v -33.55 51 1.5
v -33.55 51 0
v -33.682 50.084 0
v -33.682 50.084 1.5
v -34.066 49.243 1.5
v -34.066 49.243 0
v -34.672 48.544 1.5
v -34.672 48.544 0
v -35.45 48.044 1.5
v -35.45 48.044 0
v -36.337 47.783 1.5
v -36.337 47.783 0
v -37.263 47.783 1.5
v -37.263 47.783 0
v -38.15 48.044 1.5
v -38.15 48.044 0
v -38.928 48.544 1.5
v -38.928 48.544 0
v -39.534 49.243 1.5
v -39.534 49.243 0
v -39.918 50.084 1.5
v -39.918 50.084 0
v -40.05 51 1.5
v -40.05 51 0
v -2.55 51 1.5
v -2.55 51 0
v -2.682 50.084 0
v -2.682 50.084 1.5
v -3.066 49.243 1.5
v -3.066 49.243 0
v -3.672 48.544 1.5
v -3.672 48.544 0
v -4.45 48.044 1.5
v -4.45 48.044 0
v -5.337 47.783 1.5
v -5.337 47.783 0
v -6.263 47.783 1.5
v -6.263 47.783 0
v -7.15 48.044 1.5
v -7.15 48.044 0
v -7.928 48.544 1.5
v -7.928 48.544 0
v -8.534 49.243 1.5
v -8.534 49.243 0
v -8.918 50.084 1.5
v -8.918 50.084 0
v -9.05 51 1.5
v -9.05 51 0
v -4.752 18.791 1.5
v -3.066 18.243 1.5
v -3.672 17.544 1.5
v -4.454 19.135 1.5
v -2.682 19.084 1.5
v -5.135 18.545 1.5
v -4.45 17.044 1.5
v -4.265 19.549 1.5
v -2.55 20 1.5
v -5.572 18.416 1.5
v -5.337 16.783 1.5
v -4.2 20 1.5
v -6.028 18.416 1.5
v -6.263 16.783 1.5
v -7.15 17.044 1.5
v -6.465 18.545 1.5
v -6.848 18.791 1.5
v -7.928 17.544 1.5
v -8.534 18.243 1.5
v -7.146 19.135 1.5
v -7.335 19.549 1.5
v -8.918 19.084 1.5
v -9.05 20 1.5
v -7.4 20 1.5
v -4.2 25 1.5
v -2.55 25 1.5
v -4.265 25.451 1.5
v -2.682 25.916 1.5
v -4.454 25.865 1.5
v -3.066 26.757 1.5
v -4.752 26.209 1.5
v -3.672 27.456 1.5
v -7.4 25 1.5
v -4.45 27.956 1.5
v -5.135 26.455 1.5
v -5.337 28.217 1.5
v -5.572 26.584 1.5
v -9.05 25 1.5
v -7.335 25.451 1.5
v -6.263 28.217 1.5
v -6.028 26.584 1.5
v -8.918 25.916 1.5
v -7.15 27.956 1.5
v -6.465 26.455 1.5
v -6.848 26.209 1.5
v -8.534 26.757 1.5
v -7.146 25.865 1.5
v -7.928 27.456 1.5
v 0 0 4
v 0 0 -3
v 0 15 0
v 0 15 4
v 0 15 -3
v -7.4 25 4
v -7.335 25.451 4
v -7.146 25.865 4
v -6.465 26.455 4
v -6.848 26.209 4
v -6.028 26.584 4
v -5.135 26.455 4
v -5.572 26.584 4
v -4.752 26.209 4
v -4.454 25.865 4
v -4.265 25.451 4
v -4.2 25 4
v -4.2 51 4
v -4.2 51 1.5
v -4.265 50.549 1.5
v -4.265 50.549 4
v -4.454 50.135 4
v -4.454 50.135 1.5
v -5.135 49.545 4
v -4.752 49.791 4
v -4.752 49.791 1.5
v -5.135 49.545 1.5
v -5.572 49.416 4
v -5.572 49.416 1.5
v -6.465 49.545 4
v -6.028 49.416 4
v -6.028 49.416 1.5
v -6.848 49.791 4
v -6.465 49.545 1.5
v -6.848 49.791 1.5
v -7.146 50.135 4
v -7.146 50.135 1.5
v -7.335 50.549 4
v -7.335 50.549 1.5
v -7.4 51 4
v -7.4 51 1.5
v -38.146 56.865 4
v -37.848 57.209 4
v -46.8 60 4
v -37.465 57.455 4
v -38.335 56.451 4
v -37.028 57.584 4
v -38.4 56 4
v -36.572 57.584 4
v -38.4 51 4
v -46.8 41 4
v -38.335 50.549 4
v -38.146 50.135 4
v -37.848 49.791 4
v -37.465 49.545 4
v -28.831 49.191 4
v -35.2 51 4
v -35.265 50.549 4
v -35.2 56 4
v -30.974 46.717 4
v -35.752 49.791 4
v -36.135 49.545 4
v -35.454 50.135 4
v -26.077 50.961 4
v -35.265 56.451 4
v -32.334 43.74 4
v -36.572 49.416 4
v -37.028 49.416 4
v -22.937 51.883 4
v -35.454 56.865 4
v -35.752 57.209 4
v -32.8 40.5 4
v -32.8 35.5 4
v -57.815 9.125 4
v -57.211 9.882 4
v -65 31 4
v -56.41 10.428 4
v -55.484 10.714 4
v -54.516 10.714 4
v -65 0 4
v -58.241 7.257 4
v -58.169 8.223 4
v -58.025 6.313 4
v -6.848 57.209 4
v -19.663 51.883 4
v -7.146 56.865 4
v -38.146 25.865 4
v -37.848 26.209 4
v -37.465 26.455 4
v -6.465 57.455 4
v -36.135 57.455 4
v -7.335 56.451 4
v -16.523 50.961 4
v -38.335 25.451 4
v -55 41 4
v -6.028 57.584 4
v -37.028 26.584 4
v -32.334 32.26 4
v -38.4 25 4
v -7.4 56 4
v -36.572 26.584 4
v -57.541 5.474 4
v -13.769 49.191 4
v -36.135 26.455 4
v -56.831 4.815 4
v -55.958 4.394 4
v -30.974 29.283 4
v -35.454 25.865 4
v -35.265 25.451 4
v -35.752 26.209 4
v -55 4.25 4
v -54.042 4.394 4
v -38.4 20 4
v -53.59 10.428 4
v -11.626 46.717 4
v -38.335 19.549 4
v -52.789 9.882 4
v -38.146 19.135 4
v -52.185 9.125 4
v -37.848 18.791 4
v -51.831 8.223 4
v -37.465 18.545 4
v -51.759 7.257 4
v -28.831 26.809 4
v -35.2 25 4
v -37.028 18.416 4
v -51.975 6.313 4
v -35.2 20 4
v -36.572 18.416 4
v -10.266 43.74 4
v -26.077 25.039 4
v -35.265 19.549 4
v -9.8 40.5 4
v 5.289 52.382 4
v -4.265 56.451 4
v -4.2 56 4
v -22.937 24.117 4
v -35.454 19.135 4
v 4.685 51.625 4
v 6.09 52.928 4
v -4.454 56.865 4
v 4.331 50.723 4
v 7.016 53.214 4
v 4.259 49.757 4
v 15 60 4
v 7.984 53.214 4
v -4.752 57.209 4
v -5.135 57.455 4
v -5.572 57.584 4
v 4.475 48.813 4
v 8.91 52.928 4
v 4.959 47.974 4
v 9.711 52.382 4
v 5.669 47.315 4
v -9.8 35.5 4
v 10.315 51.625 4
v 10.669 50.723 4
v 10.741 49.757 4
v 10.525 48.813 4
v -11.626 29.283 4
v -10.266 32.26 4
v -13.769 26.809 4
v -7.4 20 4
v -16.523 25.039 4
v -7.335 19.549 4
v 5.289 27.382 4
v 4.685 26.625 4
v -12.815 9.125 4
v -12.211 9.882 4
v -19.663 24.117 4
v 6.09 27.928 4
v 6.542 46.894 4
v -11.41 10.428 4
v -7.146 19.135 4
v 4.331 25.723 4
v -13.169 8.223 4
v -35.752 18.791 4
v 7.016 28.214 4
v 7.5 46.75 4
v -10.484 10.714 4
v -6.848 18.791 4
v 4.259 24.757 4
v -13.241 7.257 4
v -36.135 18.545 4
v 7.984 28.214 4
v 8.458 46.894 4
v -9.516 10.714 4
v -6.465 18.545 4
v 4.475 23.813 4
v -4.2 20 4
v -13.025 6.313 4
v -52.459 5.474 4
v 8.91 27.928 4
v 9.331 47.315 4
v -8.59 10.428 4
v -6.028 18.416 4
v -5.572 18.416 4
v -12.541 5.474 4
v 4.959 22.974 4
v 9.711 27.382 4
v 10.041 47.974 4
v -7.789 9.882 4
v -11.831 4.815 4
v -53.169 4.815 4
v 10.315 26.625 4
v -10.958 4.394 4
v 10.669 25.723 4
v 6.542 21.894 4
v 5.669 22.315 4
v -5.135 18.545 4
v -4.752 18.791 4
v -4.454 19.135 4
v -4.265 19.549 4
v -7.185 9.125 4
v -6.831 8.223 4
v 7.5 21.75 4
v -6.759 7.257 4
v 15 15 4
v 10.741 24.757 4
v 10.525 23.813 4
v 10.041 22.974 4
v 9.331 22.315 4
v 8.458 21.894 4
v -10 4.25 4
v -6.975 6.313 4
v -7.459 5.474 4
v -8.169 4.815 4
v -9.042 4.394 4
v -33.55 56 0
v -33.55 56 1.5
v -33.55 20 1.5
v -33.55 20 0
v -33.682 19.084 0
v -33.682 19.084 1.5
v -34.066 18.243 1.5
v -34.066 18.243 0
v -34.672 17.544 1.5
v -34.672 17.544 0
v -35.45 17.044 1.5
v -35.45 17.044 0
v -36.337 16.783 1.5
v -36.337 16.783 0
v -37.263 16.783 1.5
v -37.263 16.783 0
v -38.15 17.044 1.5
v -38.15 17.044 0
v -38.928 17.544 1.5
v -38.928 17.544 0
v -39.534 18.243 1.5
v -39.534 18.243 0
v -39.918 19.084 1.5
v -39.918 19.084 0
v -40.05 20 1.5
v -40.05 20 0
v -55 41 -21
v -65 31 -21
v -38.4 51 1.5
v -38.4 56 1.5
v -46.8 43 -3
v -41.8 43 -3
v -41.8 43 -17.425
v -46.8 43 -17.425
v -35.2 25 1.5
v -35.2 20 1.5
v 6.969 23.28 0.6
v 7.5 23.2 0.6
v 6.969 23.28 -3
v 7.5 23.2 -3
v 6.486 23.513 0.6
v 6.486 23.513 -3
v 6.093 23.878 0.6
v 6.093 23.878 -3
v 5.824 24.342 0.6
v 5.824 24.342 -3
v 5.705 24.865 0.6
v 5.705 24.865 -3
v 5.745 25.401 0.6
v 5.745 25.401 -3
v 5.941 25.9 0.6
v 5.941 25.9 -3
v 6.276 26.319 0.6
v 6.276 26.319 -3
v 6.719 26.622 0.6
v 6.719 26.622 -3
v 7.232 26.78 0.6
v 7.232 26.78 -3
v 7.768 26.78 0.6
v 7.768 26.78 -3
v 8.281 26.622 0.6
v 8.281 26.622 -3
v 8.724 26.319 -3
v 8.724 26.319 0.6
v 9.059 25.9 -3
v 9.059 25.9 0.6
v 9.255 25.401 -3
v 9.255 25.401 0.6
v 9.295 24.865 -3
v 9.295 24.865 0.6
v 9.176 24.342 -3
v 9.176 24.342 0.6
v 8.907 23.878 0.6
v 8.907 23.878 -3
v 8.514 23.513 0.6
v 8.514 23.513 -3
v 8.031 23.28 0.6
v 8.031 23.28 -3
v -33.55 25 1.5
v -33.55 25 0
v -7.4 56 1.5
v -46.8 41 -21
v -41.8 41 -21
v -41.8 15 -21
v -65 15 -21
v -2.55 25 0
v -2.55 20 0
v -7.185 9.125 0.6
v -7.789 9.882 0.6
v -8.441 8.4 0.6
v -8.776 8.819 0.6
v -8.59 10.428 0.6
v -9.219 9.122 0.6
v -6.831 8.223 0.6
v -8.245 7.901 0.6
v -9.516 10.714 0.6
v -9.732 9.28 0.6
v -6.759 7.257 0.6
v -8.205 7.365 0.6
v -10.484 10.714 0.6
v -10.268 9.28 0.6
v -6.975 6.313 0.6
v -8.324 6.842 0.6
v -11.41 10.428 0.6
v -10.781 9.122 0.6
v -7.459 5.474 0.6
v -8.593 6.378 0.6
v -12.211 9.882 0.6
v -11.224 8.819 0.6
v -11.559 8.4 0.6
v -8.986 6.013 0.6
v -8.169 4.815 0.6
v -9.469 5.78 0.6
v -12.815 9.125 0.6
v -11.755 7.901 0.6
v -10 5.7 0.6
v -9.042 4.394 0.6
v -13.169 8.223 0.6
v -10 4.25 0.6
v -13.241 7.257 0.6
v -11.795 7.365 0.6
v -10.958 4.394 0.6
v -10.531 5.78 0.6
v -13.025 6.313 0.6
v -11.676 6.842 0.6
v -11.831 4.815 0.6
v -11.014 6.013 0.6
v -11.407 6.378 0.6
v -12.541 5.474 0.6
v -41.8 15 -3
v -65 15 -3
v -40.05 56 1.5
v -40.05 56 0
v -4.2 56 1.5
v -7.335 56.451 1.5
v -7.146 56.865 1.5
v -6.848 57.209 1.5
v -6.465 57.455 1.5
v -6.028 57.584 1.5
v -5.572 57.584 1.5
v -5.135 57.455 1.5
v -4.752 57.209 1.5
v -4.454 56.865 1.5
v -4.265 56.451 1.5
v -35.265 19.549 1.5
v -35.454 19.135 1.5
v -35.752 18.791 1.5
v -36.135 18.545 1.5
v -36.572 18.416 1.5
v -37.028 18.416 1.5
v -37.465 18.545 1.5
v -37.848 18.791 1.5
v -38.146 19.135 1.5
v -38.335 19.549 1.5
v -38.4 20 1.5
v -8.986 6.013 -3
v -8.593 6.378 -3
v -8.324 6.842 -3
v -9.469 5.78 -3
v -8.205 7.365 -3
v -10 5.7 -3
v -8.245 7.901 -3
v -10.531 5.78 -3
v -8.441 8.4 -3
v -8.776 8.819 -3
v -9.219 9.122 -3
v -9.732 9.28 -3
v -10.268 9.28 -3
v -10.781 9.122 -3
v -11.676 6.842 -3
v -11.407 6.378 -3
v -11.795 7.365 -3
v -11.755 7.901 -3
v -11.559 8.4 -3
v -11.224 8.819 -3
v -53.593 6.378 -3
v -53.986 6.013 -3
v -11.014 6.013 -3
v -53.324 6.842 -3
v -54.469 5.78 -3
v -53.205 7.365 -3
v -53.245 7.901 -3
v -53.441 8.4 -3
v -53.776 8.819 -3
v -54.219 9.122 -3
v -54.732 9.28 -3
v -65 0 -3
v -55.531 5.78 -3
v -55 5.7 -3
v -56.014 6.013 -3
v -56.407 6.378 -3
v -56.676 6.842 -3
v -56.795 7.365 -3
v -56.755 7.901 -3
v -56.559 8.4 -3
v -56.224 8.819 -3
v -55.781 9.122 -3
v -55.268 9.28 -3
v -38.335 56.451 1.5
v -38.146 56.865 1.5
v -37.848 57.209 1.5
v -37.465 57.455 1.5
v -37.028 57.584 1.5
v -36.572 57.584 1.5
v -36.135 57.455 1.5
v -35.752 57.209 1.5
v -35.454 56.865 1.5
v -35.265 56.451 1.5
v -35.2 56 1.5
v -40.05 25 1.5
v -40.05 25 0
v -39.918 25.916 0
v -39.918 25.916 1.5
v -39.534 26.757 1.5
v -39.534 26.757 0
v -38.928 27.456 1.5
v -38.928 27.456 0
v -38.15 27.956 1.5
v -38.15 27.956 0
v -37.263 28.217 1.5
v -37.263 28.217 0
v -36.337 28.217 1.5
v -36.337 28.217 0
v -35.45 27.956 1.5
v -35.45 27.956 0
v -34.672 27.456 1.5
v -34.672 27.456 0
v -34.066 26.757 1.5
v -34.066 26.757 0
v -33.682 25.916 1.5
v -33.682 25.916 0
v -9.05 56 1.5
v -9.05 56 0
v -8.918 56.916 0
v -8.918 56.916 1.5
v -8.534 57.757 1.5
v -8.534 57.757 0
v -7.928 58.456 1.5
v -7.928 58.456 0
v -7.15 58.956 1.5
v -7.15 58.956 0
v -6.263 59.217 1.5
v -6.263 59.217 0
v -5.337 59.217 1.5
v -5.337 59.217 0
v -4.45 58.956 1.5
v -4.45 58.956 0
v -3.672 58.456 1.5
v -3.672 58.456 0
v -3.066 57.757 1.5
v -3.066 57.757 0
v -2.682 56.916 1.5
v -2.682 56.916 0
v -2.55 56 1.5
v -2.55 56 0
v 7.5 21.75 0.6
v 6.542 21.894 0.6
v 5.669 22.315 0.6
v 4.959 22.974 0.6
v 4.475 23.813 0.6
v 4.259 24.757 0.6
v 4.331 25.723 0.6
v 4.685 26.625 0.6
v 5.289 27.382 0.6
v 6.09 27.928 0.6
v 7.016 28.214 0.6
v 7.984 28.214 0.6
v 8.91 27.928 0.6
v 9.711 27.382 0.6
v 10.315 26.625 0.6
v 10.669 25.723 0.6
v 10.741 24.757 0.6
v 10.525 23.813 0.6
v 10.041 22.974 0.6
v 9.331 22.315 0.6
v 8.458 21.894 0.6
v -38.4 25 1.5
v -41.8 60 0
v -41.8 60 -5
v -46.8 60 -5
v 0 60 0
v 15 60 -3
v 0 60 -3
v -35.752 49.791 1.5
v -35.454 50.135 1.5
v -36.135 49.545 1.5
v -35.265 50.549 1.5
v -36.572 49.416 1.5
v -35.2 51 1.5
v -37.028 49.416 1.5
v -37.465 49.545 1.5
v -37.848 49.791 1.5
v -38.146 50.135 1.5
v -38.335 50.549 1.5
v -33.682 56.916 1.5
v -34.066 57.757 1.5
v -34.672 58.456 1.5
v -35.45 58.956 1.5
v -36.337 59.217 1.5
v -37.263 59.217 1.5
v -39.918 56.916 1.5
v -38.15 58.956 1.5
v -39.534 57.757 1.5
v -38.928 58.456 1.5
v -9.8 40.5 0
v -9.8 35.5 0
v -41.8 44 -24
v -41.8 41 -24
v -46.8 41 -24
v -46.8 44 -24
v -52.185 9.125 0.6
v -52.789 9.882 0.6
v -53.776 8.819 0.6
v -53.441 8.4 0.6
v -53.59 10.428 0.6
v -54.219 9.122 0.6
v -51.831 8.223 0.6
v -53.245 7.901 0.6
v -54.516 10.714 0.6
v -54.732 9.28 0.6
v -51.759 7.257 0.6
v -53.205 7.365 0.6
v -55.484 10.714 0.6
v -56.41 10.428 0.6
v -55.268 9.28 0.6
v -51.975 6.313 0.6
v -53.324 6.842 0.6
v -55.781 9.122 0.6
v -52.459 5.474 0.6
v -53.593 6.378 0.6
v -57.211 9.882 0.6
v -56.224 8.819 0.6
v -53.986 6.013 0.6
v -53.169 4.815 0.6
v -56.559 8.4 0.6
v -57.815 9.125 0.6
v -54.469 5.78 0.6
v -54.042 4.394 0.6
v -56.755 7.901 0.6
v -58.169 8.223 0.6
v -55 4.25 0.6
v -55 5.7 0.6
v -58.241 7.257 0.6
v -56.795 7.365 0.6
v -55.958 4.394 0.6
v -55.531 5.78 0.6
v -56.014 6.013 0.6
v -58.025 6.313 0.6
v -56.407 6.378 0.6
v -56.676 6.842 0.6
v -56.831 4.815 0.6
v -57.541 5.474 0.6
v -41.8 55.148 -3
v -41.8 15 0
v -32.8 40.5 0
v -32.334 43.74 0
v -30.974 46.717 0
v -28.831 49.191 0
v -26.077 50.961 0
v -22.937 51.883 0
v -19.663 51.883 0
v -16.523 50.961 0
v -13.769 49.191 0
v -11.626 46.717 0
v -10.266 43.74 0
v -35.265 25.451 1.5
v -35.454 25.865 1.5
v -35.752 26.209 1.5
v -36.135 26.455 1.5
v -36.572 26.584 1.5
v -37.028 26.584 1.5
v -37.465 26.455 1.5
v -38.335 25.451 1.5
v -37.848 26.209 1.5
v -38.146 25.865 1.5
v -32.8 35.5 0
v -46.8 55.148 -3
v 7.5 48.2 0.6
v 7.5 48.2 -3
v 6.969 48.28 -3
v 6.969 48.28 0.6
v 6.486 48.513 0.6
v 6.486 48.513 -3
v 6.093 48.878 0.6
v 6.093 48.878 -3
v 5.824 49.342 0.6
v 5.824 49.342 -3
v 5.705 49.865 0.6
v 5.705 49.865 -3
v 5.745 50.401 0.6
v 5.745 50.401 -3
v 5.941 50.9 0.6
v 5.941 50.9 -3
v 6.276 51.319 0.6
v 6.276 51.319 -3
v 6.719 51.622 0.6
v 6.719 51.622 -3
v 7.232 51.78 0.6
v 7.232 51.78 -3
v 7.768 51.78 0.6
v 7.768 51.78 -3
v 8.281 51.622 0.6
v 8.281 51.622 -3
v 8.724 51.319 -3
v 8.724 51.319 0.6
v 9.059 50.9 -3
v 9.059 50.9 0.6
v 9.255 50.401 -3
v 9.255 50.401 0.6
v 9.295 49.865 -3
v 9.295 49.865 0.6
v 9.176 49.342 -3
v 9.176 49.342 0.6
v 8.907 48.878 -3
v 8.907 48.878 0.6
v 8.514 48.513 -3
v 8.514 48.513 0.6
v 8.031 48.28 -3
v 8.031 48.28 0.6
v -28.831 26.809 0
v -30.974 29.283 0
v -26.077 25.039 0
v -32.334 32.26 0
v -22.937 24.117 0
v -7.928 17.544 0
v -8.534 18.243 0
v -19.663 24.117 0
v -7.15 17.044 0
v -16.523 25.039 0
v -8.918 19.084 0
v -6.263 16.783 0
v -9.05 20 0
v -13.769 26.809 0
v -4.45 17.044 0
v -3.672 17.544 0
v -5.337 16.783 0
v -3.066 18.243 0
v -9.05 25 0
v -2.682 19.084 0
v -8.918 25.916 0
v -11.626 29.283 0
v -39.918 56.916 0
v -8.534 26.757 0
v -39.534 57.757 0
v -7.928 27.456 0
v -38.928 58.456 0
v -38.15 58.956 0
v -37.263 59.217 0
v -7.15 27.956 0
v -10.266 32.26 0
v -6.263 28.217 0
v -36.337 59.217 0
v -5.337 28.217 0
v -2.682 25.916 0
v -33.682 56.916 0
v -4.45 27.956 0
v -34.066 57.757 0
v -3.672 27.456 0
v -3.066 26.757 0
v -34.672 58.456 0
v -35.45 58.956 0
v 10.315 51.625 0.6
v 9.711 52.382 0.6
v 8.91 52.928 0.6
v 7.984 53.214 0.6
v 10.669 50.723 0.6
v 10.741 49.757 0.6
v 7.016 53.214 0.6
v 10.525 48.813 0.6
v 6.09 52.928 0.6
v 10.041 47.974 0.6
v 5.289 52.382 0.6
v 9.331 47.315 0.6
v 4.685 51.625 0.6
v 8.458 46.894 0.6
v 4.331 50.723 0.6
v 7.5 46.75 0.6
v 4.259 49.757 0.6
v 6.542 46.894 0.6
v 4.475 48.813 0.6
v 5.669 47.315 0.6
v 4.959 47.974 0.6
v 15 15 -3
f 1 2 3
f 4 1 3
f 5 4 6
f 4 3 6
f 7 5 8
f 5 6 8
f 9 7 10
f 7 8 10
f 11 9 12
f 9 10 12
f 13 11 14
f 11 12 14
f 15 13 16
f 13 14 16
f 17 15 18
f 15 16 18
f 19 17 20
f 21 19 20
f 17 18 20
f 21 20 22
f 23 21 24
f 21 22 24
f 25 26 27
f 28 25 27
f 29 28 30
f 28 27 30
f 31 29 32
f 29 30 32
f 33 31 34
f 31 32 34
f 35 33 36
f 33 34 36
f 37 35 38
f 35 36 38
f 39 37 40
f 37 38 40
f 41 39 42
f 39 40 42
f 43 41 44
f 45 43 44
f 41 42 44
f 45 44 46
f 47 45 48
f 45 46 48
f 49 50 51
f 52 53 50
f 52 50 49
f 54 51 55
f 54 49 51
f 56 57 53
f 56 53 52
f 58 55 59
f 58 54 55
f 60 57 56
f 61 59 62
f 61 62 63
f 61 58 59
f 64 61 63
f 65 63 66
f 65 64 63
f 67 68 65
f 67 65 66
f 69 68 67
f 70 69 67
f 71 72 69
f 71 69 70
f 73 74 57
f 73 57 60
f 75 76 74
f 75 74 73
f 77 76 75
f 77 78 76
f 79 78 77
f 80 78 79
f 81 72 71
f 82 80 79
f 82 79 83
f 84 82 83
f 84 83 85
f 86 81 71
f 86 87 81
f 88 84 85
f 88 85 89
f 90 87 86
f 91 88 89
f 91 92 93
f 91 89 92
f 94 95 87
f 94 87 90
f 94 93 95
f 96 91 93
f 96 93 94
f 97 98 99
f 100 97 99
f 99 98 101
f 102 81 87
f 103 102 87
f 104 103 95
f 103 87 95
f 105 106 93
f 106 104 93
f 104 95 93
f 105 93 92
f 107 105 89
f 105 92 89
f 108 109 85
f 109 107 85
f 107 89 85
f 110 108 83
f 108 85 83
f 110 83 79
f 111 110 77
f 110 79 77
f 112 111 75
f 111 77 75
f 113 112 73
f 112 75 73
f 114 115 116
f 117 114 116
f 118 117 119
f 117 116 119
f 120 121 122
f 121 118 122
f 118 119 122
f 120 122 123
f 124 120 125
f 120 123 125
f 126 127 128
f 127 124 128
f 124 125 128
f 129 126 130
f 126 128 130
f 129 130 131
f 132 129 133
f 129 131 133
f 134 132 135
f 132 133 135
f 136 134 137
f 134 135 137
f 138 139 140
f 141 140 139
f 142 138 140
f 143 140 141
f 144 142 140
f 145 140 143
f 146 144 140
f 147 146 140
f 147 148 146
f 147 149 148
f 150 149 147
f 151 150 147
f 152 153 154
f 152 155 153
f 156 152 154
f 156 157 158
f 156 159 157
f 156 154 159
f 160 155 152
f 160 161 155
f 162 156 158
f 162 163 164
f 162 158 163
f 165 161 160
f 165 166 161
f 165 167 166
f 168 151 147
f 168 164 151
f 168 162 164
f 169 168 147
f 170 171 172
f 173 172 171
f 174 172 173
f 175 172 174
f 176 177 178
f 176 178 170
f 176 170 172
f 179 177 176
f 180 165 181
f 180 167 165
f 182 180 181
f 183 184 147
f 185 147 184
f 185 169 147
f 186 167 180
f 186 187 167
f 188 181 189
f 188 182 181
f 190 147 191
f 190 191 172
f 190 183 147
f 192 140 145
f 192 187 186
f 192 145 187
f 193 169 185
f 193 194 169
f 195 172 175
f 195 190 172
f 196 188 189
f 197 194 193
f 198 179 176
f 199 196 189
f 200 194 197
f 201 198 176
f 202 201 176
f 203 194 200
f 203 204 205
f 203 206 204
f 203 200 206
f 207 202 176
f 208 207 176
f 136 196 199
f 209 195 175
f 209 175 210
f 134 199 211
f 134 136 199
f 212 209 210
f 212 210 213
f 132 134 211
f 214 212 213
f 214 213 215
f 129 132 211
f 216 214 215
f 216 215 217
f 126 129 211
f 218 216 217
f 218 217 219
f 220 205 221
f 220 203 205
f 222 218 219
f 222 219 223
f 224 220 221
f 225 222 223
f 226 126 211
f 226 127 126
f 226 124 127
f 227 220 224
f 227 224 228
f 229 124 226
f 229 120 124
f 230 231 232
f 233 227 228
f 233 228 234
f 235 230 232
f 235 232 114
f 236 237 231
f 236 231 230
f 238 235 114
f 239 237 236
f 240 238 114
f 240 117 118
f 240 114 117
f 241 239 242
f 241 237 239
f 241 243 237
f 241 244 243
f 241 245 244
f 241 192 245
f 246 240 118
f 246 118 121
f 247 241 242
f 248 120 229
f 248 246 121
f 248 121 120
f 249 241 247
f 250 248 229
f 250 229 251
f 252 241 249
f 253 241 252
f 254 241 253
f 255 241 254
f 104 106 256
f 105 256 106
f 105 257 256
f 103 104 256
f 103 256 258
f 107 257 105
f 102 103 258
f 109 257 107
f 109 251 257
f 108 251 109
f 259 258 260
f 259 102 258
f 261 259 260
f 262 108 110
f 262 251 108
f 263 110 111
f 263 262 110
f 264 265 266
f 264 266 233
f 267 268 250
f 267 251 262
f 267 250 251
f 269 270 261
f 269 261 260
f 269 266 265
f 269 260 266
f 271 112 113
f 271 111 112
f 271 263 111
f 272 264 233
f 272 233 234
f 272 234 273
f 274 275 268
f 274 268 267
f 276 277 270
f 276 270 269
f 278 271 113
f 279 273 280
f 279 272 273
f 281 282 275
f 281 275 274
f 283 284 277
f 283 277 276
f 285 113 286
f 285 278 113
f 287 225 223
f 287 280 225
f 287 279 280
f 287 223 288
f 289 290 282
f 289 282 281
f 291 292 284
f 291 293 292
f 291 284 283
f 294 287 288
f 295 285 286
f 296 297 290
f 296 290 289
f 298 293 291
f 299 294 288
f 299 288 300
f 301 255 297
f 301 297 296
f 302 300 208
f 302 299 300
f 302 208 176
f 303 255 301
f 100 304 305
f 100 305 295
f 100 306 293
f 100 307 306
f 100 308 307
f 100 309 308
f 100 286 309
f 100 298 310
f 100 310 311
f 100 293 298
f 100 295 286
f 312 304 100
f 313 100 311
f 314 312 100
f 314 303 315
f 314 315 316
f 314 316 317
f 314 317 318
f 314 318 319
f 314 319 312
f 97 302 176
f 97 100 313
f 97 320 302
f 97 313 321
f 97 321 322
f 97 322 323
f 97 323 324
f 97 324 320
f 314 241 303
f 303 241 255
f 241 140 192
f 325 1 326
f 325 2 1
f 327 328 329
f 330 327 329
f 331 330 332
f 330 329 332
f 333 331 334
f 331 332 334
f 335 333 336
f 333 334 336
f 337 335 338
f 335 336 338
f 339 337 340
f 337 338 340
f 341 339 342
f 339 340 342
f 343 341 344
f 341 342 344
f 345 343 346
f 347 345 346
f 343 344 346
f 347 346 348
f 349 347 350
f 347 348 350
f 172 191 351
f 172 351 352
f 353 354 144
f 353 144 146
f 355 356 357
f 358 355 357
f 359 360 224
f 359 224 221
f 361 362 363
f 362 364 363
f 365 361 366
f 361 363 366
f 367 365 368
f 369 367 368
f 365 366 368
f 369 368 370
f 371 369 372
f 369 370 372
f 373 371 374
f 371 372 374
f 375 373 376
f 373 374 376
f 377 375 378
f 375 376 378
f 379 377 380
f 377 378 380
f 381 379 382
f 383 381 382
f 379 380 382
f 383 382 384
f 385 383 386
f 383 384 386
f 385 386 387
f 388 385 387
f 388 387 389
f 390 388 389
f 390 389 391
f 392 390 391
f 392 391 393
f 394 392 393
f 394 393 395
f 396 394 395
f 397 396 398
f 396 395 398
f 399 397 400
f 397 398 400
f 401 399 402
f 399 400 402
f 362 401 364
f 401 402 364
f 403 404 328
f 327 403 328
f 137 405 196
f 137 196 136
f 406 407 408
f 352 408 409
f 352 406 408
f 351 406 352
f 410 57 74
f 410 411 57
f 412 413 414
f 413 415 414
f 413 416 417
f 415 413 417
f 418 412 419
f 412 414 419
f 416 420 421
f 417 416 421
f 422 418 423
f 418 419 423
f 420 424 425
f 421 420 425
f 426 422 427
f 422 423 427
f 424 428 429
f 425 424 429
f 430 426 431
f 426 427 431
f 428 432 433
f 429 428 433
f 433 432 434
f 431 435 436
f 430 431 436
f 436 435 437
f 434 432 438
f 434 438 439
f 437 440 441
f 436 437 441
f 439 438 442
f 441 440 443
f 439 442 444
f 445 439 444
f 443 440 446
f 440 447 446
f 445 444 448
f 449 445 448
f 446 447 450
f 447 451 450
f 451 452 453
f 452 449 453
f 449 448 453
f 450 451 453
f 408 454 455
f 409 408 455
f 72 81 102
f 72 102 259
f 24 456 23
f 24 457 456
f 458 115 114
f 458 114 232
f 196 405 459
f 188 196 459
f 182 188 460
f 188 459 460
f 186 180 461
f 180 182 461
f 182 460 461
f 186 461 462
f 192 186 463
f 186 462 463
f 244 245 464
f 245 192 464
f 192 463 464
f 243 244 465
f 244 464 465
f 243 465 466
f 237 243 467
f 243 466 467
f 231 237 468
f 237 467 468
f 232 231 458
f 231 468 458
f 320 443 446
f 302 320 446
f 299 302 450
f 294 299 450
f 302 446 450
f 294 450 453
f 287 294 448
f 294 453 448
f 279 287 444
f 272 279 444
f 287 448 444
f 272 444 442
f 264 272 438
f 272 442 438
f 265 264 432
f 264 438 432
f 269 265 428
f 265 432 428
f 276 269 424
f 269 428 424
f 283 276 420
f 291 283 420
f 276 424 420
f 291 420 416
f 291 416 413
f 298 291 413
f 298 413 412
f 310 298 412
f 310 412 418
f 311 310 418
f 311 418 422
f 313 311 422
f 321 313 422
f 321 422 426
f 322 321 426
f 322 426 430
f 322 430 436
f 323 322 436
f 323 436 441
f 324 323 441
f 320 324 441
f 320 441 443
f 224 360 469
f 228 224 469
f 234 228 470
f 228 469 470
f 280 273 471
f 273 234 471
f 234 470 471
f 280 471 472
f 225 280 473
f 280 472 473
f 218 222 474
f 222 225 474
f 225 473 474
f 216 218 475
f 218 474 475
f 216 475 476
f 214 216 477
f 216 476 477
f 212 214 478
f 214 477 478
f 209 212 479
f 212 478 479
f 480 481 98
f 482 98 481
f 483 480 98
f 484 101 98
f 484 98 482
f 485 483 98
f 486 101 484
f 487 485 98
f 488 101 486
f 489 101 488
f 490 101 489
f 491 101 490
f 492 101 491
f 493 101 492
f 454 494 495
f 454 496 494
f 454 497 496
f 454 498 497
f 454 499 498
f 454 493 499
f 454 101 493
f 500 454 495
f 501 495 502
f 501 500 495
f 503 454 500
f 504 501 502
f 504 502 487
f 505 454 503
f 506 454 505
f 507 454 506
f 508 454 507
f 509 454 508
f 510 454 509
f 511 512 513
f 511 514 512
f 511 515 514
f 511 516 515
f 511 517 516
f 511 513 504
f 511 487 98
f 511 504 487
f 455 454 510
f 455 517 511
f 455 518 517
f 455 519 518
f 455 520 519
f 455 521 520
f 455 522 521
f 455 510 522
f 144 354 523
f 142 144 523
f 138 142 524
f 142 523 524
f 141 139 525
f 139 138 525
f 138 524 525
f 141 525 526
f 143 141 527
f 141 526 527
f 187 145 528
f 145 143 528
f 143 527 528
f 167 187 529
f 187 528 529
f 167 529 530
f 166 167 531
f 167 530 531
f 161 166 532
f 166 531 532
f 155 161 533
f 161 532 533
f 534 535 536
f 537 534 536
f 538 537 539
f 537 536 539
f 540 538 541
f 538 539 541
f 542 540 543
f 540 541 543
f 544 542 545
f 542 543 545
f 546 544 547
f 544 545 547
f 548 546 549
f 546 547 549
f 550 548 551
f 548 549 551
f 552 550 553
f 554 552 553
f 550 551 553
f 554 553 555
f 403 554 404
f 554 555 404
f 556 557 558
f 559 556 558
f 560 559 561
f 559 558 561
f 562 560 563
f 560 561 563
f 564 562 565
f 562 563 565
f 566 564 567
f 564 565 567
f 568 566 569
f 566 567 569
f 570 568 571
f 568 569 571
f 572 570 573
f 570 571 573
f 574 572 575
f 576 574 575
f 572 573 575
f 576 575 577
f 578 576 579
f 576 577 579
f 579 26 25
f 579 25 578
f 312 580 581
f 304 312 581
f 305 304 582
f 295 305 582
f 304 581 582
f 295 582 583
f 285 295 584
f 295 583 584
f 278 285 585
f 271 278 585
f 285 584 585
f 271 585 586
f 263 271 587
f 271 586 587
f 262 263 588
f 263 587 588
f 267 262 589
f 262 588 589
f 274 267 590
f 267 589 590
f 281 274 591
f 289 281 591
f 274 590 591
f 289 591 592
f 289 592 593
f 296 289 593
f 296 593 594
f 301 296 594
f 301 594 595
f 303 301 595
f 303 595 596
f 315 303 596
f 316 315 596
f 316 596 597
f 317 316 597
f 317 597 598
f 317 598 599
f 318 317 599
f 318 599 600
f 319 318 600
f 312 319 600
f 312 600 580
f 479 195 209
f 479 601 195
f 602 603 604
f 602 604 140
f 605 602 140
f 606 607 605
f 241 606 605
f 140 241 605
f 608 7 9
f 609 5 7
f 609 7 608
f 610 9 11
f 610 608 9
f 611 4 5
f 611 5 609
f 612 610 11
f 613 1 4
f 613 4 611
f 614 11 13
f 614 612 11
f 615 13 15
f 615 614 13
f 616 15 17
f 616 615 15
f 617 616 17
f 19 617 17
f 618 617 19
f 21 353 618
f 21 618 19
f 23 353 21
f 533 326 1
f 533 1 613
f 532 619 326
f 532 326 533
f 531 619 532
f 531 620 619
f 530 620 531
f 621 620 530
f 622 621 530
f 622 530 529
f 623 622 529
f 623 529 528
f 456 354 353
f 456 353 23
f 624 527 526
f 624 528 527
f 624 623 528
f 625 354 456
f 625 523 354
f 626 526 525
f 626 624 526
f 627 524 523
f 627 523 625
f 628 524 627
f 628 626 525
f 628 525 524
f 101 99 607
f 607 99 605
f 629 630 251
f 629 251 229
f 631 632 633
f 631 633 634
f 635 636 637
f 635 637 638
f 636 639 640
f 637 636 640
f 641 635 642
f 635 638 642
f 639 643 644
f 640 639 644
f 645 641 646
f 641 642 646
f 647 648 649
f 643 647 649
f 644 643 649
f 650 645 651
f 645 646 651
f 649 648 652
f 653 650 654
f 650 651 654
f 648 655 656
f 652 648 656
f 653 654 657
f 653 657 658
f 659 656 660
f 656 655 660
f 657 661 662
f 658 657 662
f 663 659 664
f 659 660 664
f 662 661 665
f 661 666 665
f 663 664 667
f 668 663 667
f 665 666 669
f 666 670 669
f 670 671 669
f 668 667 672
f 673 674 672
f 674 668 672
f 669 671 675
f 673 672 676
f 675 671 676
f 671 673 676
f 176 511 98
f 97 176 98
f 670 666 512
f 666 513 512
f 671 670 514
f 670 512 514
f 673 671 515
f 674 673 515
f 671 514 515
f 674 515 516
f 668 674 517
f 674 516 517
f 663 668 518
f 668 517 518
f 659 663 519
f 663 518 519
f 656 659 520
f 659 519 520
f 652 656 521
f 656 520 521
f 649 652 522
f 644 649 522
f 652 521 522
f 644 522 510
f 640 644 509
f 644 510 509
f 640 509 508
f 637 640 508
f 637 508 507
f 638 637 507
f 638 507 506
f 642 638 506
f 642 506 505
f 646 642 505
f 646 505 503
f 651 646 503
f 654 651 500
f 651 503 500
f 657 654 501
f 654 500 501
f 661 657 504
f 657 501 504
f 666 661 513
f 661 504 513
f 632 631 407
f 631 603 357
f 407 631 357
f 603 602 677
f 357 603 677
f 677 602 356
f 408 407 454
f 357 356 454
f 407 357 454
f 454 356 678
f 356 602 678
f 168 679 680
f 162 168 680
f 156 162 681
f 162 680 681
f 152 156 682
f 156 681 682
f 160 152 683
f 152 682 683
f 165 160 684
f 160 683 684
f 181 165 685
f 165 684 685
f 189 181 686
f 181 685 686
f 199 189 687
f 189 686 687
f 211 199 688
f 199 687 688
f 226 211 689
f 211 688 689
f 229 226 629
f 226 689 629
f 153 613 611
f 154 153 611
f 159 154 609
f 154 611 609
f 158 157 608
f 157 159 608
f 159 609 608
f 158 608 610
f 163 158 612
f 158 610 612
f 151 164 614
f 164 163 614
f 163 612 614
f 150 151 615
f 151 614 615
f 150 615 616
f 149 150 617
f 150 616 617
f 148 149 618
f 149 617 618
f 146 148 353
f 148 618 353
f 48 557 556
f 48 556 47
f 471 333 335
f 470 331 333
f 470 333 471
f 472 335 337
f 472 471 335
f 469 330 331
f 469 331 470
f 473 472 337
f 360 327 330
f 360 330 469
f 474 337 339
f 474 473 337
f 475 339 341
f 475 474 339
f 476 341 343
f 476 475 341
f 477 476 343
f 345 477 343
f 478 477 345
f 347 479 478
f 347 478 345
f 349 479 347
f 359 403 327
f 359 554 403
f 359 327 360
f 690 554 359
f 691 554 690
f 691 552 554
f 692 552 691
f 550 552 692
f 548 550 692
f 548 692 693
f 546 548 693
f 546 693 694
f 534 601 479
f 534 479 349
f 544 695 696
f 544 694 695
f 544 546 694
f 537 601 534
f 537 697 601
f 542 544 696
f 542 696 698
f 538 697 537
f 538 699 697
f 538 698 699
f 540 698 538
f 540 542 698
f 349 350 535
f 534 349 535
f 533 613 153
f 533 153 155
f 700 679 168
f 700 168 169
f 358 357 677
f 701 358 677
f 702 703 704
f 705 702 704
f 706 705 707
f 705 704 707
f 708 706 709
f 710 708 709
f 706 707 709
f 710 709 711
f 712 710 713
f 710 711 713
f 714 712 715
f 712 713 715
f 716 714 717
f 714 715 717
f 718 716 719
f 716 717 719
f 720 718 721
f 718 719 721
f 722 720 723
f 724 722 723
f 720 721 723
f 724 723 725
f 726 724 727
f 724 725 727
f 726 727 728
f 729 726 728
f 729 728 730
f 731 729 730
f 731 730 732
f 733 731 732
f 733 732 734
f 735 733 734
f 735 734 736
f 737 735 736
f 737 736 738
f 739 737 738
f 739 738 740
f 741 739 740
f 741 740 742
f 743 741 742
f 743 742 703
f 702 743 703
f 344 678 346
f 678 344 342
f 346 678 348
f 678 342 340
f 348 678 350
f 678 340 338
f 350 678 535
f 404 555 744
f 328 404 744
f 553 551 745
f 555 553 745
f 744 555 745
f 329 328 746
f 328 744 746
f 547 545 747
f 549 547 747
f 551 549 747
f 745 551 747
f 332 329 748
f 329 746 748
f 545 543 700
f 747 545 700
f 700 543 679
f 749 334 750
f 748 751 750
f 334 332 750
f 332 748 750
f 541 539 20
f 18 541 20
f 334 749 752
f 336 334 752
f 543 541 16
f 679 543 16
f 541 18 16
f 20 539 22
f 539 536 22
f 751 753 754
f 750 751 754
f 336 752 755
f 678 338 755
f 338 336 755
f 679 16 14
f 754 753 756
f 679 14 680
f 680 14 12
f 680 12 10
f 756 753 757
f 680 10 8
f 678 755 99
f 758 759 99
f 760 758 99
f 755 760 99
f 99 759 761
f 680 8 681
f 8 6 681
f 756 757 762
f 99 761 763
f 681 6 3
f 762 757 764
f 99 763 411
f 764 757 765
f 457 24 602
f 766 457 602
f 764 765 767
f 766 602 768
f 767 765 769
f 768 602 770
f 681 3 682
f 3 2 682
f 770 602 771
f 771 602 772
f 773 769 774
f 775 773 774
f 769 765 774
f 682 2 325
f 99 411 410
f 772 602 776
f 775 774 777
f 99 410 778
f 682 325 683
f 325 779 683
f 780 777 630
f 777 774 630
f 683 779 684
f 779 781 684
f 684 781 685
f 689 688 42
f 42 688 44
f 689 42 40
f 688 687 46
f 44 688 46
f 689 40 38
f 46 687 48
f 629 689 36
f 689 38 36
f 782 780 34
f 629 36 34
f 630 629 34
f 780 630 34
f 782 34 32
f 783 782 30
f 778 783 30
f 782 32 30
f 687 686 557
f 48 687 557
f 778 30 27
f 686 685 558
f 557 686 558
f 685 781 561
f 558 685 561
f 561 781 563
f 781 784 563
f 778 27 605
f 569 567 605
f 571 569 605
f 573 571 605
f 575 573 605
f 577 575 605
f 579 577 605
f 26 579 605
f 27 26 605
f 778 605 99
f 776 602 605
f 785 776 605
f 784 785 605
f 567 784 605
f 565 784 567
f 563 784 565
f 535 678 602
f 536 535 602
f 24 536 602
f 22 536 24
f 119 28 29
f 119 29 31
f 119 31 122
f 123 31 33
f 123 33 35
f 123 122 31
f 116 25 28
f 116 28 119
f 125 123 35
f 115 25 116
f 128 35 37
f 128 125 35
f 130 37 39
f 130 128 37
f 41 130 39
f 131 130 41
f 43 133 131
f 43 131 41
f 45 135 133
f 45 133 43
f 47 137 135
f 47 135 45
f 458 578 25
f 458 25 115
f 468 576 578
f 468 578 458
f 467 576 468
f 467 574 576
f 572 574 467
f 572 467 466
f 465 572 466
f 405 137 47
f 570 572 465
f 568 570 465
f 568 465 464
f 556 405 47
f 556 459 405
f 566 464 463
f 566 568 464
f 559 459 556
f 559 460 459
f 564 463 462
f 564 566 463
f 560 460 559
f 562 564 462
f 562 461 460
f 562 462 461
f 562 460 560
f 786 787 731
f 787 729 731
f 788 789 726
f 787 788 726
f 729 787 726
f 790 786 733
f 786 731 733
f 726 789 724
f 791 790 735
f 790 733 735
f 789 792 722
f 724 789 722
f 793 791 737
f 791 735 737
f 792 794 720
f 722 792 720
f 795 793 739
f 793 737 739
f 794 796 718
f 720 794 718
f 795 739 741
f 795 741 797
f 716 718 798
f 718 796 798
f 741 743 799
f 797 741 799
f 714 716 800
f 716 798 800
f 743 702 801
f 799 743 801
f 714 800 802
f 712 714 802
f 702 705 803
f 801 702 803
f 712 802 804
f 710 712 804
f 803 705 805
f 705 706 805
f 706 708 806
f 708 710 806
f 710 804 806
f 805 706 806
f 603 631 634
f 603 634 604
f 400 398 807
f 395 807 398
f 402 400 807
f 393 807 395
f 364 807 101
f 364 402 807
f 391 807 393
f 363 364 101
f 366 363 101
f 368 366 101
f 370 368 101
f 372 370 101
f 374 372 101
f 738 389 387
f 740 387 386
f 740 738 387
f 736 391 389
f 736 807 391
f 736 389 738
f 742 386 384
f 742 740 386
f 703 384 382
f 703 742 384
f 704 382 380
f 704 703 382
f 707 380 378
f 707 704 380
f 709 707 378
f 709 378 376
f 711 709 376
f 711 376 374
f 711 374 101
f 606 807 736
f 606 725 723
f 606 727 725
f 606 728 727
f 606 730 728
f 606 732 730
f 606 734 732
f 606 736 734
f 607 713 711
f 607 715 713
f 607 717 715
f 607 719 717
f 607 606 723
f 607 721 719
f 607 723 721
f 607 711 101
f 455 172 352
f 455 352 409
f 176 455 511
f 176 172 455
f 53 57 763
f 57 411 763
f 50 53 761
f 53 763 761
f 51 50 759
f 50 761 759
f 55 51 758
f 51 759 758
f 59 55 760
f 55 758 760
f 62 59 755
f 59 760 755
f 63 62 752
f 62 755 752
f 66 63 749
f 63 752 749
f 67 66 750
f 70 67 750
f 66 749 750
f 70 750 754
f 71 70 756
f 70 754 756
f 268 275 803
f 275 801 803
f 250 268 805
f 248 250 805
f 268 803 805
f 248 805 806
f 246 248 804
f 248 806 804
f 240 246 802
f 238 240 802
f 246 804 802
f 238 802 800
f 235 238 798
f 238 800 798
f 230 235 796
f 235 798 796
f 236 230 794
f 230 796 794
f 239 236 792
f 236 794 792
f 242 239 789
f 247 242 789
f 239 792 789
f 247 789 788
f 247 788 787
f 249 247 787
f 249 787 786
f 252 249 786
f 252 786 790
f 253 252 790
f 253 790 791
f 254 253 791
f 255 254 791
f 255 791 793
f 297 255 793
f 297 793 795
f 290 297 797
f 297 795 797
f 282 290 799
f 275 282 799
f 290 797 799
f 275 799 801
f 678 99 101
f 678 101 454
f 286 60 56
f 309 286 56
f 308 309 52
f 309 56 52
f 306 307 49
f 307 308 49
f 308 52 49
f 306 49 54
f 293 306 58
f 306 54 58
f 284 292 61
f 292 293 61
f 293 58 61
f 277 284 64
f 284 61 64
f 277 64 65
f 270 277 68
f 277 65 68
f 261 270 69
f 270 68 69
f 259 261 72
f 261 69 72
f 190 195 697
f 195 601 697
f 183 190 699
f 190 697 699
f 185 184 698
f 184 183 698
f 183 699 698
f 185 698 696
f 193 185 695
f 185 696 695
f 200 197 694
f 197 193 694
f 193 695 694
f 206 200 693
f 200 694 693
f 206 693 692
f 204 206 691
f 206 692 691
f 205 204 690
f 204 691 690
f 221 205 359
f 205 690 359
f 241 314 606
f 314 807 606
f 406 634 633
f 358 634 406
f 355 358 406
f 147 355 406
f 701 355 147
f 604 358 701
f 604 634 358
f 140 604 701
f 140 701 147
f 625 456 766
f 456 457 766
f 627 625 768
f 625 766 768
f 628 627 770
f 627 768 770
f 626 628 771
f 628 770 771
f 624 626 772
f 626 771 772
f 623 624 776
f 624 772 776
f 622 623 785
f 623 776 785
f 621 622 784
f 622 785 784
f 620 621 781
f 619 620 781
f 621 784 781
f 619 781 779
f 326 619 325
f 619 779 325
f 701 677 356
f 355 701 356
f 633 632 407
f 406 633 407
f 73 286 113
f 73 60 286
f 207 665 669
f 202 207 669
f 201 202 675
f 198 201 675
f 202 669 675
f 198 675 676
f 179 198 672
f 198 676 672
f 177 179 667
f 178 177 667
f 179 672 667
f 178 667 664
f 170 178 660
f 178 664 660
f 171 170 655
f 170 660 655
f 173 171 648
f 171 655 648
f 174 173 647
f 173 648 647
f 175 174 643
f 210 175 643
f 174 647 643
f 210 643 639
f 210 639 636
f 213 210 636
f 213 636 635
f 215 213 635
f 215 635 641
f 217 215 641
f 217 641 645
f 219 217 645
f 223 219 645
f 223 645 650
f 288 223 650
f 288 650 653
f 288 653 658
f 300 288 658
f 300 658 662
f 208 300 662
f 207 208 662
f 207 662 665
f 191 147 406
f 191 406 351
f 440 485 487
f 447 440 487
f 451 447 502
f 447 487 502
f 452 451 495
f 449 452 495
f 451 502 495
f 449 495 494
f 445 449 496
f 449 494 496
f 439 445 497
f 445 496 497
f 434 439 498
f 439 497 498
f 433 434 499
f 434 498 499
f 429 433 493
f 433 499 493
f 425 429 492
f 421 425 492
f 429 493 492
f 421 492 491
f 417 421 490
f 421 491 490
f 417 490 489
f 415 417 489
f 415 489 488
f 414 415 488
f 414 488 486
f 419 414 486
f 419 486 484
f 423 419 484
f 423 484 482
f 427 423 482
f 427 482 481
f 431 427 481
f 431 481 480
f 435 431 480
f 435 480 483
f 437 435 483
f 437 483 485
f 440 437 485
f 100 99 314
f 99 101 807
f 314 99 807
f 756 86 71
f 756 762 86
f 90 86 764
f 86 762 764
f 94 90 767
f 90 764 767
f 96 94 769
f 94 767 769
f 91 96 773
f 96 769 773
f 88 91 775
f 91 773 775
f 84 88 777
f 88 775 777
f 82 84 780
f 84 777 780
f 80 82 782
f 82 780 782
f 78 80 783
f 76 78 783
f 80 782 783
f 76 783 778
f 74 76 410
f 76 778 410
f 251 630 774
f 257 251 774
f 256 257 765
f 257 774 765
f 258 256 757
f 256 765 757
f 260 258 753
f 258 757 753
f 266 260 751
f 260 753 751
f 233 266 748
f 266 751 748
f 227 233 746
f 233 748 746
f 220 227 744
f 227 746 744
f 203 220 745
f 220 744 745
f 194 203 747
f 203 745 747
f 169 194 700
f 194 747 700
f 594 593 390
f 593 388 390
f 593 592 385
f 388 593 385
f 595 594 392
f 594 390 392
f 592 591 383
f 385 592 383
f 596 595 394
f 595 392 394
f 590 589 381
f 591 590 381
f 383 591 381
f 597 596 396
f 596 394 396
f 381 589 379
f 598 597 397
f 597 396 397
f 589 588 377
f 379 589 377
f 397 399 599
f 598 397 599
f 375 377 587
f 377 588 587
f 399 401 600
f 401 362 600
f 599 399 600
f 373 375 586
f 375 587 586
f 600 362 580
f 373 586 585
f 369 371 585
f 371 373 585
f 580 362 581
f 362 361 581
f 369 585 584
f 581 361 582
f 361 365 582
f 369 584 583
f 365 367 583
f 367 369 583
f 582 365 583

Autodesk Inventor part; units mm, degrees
ref_plane "YZ Plane" through (0, 0, 0) normal (1, 0, 0) x (0, 1, 0)
ref_plane "XZ Plane" through (0, 0, 0) normal (0, 1, 0) x (-1, 0, 0)
ref_plane "XY Plane" through (0, 0, 0) normal (0, 0, 1) x (1, 0, 0)
sketch "Sketch1" plane through (0, 0, 0) normal (0, 0, 1) x (1, 0, 0)
  line L0 (0, 0) -> (0, 15)
  line L1 (0, 15) -> (15, 15)
  line L2 (15, 15) -> (15, 60)
  line L3 (15, 60) -> (-65, 60)
  line L4 (-65, 60) -> (-65, 0)
  line L5 (-65, 0) -> (0, 0)
  line L6 (-36.8, 25) -> (-36.8, 20) construction
  line L7 (-38.4, 25) -> (-38.4, 20)
  line L8 (-35.2, 20) -> (-35.2, 25)
  arc A0 (-35.2, 25) -> (-38.4, 25) centre (-36.8, 25) ccw
  arc A1 (-38.4, 20) -> (-35.2, 20) centre (-36.8, 20) ccw
  line L9 (-5.8, 25) -> (-5.8, 20) construction
  line L10 (-7.4, 25) -> (-7.4, 20)
  line L11 (-4.2, 20) -> (-4.2, 25)
  arc A2 (-4.2, 25) -> (-7.4, 25) centre (-5.8, 25) ccw
  arc A3 (-7.4, 20) -> (-4.2, 20) centre (-5.8, 20) ccw
  line L12 (-5.8, 56) -> (-5.8, 51) construction
  line L13 (-7.4, 56) -> (-7.4, 51)
  line L14 (-4.2, 51) -> (-4.2, 56)
  arc A4 (-4.2, 56) -> (-7.4, 56) centre (-5.8, 56) ccw
  arc A5 (-7.4, 51) -> (-4.2, 51) centre (-5.8, 51) ccw
  line L15 (-36.8, 56) -> (-36.8, 51) construction
  line L16 (-38.4, 56) -> (-38.4, 51)
  line L17 (-35.2, 51) -> (-35.2, 56)
  arc A6 (-35.2, 56) -> (-38.4, 56) centre (-36.8, 56) ccw
  arc A7 (-38.4, 51) -> (-35.2, 51) centre (-36.8, 51) ccw
  line L18 (-21.3, 40.5) -> (-21.3, 35.5) construction
  line L19 (-32.8, 40.5) -> (-32.8, 35.5)
  line L20 (-9.8, 35.5) -> (-9.8, 40.5)
  arc A8 (-9.8, 40.5) -> (-32.8, 40.5) centre (-21.3, 40.5) ccw
  arc A9 (-32.8, 35.5) -> (-9.8, 35.5) centre (-21.3, 35.5) ccw
  line L21 (-41.8, 60) -> (-41.8, 41)
  line L22 (-41.8, 41) -> (-55, 41)
  line L23 (-55, 41) -> (-65, 31)
  point P0 (-36.8, 22.5)
  point P1 (-5.8, 22.5)
  point P2 (-5.8, 53.5)
  point P3 (-36.8, 53.5)
  point P4 (-21.3, 38)
  dimension "d0" = 15
  dimension "d57" = 3.2
  dimension "d58" = 31
  dimension "d59" = 31
  dimension "d60" = 36.3
  dimension "d61" = 11.5
  dimension "d62" = 5
  dimension "d63" = 15.5
  dimension "d64" = 15.5
  dimension "d65" = 60
  dimension "d66" = 80
  dimension "d67" = 38
  dimension "d68" = 45
  dimension "d69" = 31
  dimension "d70" = 19
  dimension "d71" = 5
extrude "Extrusion1" add sketch "Sketch1" along normal blind 4 contours L5 L4 L23 L22 L21 L3 L2 L1 L0
sketch "Sketch2" plane through (0, 0, 0) normal (0, 0, -1) x (-1, 0, 0)
  line L0 (0, 15) -> (-15, 15) projected
  line L1 (0, 0) -> (0, 15) projected
  line L2 (65, 0) -> (0, 0) projected
  line L3 (65, 31) -> (65, 0) projected
  line L4 (-15, 60) -> (41.8, 60) projected
  line L5 (-15, 15) -> (-15, 60) projected
  line L6 (0, 15) -> (65, 15)
  line L7 (65, 31) -> (65, 0) projected
  line L8 (0, 15) -> (-15, 15) projected
  line L9 (0, 15) -> (0, 60)
  line L10 (-15, 60) -> (41.8, 60) projected
  line L11 (55, 41) -> (65, 31) projected
  line L12 (41.8, 41) -> (55, 41) projected
  line L13 (41.8, 60) -> (41.8, 41) projected
  point P0 (65, 60)
  point P1 (0, 60)
extrude "Extrusion2" add sketch "Sketch2" along normal blind 3 contours L6 L3 L2 L1 | L0 L5 L4 L9
sketch "Sketch3" plane through (0, 0, 4) normal (0, 0, 1) x (1, 0, 0)
  line L0 (-65, 31) -> (-65, 0) projected
  line L1 (-65, 0) -> (0, 0) projected
  line L2 (0, 0) -> (0, 15) projected
  line L3 (0, 15) -> (15, 15) projected
  line L4 (15, 15) -> (15, 60) projected
  line L5 (15, 60) -> (-41.8, 60) projected
  line L6 (-65, 0) -> (-65, 15) projected
  line L7 (0, 60) -> (15, 60) projected
  line L8 (-41.8, 60) -> (-41.8, 41) projected
  line L9 (-41.8, 41) -> (-55, 41) projected
  line L10 (-55, 41) -> (-65, 31) projected
  point P0 (-10, 7.5)
  point P1 (-55, 7.5)
  point P2 (7.5, 25)
  point P3 (7.5, 50)
  point P4 (0, 7.5)
  point P5 (-65, 7.5)
  point P6 (7.5, 15)
  point P7 (7.5, 60)
  dimension "d18" = 10
  dimension "d19" = 10
  dimension "d20" = 10
  dimension "d21" = 10
hole "Hole1" at (-10, 7.5, 4) at (-55, 7.5, 4) at (7.5, 25, 4) at (7.5, 50, 4) direction (0, 0, -1) diameter 3.6 end through all counterbore diameter 6.5 counterbore depth 3.4 clearance for "Socket Head Cap Screw ISO 4762" size "M3" standard "ISO"
sketch "Sketch8" plane through (0, 0, 0) normal (0, 0, -1) x (-1, 0, 0)
  line L0 (0, 15) -> (65, 15) projected
  line L1 (65, 31) -> (65, 15) projected
  line L2 (55, 41) -> (65, 31) projected
  line L3 (41.8, 41) -> (55, 41) projected
  line L4 (41.8, 60) -> (41.8, 41) projected
  line L5 (0, 60) -> (41.8, 60) projected
  line L6 (0, 60) -> (0, 15) projected
  arc A0 (32.8, 40.5) -> (9.8, 40.5) centre (21.3, 40.5) ccw projected
  line L7 (32.8, 35.5) -> (32.8, 40.5) projected
  arc A1 (9.8, 35.5) -> (32.8, 35.5) centre (21.3, 35.5) ccw projected
  line L8 (9.8, 40.5) -> (9.8, 35.5) projected
  arc A2 (38.4, 56) -> (35.2, 56) centre (36.8, 56) ccw projected
  line L9 (38.4, 51) -> (38.4, 56) projected
  arc A3 (35.2, 51) -> (38.4, 51) centre (36.8, 51) ccw projected
  line L10 (35.2, 56) -> (35.2, 51) projected
  arc A4 (7.4, 56) -> (4.2, 56) centre (5.8, 56) ccw projected
  line L11 (7.4, 51) -> (7.4, 56) projected
  arc A5 (4.2, 51) -> (7.4, 51) centre (5.8, 51) ccw projected
  line L12 (4.2, 56) -> (4.2, 51) projected
  arc A6 (7.4, 25) -> (4.2, 25) centre (5.8, 25) ccw projected
  line L13 (7.4, 20) -> (7.4, 25) projected
  arc A7 (4.2, 20) -> (7.4, 20) centre (5.8, 20) ccw projected
  line L14 (4.2, 25) -> (4.2, 20) projected
  arc A8 (38.4, 25) -> (35.2, 25) centre (36.8, 25) ccw projected
  line L15 (38.4, 20) -> (38.4, 25) projected
  arc A9 (35.2, 20) -> (38.4, 20) centre (36.8, 20) ccw projected
  line L16 (35.2, 25) -> (35.2, 20) projected
  line L17 (41.8, 41) -> (55, 41) projected
  line L18 (41.8, 41) -> (41.8, 15)
  point P0 (0, 0)
extrude "Extrusion5" add sketch "Sketch8" along normal blind 21 contours L18 L3 L2 L1 L0
sketch "Sketch9" plane through (-41.8, 41, 4) normal (-1, 0, 0) x (0, 0, 1)
  line L0 (-4, 19) -> (-4, 0) projected
  line L1 (-4, 0) -> (0, 0) projected
  line L2 (0, 19) -> (0, 0) projected
  line L3 (-4, 19) -> (0, 19) projected
  line L4 (-4, 0) -> (0, 0) projected
  line L5 (-4, 0) -> (-28, 0)
  line L6 (-28, 0) -> (-28, 3)
  line L7 (-28, 3) -> (-9, 19)
  line L8 (-9, 19) -> (-4, 19)
  line L9 (0, 19) -> (-7, 19) projected
  line L10 (-21.4252, 2) -> (-7, 14.1475)
  line L11 (-7, 14.1475) -> (-7, 2)
  line L12 (-7, 2) -> (-21.4252, 2)
  point P0 (-4, -41)
  dimension "d74" = 24
  dimension "d75" = 3
  dimension "d76" = 5
  dimension "d77" = 5
  dimension "d78" = 3
  dimension "d79" = 2
extrude "Extrusion6" add sketch "Sketch9" along normal blind 5
sketch "Sketch10" plane through (0, 0, 0) normal (0, 0, -1) x (-1, 0, 0)
  line L0 (41.8, 60) -> (41.8, 15) projected
  line L1 (0, 60) -> (41.8, 60) projected
  line L2 (0, 60) -> (0, 15) projected
  line L3 (0, 15) -> (41.8, 15) projected
  arc A0 (32.8, 40.5) -> (9.8, 40.5) centre (21.3, 40.5) ccw projected
  line L4 (32.8, 35.5) -> (32.8, 40.5) projected
  arc A1 (9.8, 35.5) -> (32.8, 35.5) centre (21.3, 35.5) ccw projected
  line L5 (9.8, 40.5) -> (9.8, 35.5) projected
  arc A2 (38.4, 56) -> (35.2, 56) centre (36.8, 56) ccw projected
  line L6 (38.4, 51) -> (38.4, 56) projected
  arc A3 (35.2, 51) -> (38.4, 51) centre (36.8, 51) ccw projected
  line L7 (35.2, 56) -> (35.2, 51) projected
  arc A4 (7.4, 56) -> (4.2, 56) centre (5.8, 56) ccw projected
  line L8 (7.4, 51) -> (7.4, 56) projected
  arc A5 (4.2, 51) -> (7.4, 51) centre (5.8, 51) ccw projected
  line L9 (4.2, 56) -> (4.2, 51) projected
  arc A6 (7.4, 25) -> (4.2, 25) centre (5.8, 25) ccw projected
  line L10 (7.4, 20) -> (7.4, 25) projected
  arc A7 (4.2, 20) -> (7.4, 20) centre (5.8, 20) ccw projected
  line L11 (4.2, 25) -> (4.2, 20) projected
  arc A8 (38.4, 25) -> (35.2, 25) centre (36.8, 25) ccw projected
  line L12 (38.4, 20) -> (38.4, 25) projected
  arc A9 (35.2, 20) -> (38.4, 20) centre (36.8, 20) ccw projected
  line L13 (35.2, 25) -> (35.2, 20) projected
  line L14 (36.8, 56) -> (36.8, 51) construction
  line L15 (40.05, 56) -> (40.05, 51)
  line L16 (33.55, 51) -> (33.55, 56)
  arc A10 (40.05, 56) -> (33.55, 56) centre (36.8, 56) ccw
  arc A11 (33.55, 51) -> (40.05, 51) centre (36.8, 51) ccw
  line L17 (5.8, 51) -> (5.8, 56) construction
  line L18 (2.55, 51) -> (2.55, 56)
  line L19 (9.05, 56) -> (9.05, 51)
  arc A12 (2.55, 51) -> (9.05, 51) centre (5.8, 51) ccw
  arc A13 (9.05, 56) -> (2.55, 56) centre (5.8, 56) ccw
  line L20 (5.8, 20) -> (5.8, 25) construction
  line L21 (2.55, 20) -> (2.55, 25)
  line L22 (9.05, 25) -> (9.05, 20)
  arc A14 (2.55, 20) -> (9.05, 20) centre (5.8, 20) ccw
  arc A15 (9.05, 25) -> (2.55, 25) centre (5.8, 25) ccw
  line L23 (36.8, 20) -> (36.8, 25) construction
  line L24 (40.05, 20) -> (40.05, 25)
  line L25 (33.55, 25) -> (33.55, 20)
  arc A16 (33.55, 20) -> (40.05, 20) centre (36.8, 20) ccw
  arc A17 (40.05, 25) -> (33.55, 25) centre (36.8, 25) ccw
  point P0 (0, 0)
  point P1 (36.8, 53.5)
  point P2 (5.8, 53.5)
  point P3 (5.8, 22.5)
  point P4 (36.8, 22.5)
  dimension "d82" = 6.5
extrude "Extrusion7" cut sketch "Sketch10" against normal blind 1.5 contours L15 A11 L16 A10 | L18 A13 L19 A12 | L21 A15 L22 A14 | A16 L25 A17 L24
equation "\"d59\" = d58"
equation "\"d63\" = 0.5 * d58"
equation "\"d64\" = 0.5 * d59"
equation "\"d19\" = d18"
equation "\"d20\" = d18"
equation "\"d21\" = d20"
properties part number "Alpha Motor Mount" material "ABS Plastic"
